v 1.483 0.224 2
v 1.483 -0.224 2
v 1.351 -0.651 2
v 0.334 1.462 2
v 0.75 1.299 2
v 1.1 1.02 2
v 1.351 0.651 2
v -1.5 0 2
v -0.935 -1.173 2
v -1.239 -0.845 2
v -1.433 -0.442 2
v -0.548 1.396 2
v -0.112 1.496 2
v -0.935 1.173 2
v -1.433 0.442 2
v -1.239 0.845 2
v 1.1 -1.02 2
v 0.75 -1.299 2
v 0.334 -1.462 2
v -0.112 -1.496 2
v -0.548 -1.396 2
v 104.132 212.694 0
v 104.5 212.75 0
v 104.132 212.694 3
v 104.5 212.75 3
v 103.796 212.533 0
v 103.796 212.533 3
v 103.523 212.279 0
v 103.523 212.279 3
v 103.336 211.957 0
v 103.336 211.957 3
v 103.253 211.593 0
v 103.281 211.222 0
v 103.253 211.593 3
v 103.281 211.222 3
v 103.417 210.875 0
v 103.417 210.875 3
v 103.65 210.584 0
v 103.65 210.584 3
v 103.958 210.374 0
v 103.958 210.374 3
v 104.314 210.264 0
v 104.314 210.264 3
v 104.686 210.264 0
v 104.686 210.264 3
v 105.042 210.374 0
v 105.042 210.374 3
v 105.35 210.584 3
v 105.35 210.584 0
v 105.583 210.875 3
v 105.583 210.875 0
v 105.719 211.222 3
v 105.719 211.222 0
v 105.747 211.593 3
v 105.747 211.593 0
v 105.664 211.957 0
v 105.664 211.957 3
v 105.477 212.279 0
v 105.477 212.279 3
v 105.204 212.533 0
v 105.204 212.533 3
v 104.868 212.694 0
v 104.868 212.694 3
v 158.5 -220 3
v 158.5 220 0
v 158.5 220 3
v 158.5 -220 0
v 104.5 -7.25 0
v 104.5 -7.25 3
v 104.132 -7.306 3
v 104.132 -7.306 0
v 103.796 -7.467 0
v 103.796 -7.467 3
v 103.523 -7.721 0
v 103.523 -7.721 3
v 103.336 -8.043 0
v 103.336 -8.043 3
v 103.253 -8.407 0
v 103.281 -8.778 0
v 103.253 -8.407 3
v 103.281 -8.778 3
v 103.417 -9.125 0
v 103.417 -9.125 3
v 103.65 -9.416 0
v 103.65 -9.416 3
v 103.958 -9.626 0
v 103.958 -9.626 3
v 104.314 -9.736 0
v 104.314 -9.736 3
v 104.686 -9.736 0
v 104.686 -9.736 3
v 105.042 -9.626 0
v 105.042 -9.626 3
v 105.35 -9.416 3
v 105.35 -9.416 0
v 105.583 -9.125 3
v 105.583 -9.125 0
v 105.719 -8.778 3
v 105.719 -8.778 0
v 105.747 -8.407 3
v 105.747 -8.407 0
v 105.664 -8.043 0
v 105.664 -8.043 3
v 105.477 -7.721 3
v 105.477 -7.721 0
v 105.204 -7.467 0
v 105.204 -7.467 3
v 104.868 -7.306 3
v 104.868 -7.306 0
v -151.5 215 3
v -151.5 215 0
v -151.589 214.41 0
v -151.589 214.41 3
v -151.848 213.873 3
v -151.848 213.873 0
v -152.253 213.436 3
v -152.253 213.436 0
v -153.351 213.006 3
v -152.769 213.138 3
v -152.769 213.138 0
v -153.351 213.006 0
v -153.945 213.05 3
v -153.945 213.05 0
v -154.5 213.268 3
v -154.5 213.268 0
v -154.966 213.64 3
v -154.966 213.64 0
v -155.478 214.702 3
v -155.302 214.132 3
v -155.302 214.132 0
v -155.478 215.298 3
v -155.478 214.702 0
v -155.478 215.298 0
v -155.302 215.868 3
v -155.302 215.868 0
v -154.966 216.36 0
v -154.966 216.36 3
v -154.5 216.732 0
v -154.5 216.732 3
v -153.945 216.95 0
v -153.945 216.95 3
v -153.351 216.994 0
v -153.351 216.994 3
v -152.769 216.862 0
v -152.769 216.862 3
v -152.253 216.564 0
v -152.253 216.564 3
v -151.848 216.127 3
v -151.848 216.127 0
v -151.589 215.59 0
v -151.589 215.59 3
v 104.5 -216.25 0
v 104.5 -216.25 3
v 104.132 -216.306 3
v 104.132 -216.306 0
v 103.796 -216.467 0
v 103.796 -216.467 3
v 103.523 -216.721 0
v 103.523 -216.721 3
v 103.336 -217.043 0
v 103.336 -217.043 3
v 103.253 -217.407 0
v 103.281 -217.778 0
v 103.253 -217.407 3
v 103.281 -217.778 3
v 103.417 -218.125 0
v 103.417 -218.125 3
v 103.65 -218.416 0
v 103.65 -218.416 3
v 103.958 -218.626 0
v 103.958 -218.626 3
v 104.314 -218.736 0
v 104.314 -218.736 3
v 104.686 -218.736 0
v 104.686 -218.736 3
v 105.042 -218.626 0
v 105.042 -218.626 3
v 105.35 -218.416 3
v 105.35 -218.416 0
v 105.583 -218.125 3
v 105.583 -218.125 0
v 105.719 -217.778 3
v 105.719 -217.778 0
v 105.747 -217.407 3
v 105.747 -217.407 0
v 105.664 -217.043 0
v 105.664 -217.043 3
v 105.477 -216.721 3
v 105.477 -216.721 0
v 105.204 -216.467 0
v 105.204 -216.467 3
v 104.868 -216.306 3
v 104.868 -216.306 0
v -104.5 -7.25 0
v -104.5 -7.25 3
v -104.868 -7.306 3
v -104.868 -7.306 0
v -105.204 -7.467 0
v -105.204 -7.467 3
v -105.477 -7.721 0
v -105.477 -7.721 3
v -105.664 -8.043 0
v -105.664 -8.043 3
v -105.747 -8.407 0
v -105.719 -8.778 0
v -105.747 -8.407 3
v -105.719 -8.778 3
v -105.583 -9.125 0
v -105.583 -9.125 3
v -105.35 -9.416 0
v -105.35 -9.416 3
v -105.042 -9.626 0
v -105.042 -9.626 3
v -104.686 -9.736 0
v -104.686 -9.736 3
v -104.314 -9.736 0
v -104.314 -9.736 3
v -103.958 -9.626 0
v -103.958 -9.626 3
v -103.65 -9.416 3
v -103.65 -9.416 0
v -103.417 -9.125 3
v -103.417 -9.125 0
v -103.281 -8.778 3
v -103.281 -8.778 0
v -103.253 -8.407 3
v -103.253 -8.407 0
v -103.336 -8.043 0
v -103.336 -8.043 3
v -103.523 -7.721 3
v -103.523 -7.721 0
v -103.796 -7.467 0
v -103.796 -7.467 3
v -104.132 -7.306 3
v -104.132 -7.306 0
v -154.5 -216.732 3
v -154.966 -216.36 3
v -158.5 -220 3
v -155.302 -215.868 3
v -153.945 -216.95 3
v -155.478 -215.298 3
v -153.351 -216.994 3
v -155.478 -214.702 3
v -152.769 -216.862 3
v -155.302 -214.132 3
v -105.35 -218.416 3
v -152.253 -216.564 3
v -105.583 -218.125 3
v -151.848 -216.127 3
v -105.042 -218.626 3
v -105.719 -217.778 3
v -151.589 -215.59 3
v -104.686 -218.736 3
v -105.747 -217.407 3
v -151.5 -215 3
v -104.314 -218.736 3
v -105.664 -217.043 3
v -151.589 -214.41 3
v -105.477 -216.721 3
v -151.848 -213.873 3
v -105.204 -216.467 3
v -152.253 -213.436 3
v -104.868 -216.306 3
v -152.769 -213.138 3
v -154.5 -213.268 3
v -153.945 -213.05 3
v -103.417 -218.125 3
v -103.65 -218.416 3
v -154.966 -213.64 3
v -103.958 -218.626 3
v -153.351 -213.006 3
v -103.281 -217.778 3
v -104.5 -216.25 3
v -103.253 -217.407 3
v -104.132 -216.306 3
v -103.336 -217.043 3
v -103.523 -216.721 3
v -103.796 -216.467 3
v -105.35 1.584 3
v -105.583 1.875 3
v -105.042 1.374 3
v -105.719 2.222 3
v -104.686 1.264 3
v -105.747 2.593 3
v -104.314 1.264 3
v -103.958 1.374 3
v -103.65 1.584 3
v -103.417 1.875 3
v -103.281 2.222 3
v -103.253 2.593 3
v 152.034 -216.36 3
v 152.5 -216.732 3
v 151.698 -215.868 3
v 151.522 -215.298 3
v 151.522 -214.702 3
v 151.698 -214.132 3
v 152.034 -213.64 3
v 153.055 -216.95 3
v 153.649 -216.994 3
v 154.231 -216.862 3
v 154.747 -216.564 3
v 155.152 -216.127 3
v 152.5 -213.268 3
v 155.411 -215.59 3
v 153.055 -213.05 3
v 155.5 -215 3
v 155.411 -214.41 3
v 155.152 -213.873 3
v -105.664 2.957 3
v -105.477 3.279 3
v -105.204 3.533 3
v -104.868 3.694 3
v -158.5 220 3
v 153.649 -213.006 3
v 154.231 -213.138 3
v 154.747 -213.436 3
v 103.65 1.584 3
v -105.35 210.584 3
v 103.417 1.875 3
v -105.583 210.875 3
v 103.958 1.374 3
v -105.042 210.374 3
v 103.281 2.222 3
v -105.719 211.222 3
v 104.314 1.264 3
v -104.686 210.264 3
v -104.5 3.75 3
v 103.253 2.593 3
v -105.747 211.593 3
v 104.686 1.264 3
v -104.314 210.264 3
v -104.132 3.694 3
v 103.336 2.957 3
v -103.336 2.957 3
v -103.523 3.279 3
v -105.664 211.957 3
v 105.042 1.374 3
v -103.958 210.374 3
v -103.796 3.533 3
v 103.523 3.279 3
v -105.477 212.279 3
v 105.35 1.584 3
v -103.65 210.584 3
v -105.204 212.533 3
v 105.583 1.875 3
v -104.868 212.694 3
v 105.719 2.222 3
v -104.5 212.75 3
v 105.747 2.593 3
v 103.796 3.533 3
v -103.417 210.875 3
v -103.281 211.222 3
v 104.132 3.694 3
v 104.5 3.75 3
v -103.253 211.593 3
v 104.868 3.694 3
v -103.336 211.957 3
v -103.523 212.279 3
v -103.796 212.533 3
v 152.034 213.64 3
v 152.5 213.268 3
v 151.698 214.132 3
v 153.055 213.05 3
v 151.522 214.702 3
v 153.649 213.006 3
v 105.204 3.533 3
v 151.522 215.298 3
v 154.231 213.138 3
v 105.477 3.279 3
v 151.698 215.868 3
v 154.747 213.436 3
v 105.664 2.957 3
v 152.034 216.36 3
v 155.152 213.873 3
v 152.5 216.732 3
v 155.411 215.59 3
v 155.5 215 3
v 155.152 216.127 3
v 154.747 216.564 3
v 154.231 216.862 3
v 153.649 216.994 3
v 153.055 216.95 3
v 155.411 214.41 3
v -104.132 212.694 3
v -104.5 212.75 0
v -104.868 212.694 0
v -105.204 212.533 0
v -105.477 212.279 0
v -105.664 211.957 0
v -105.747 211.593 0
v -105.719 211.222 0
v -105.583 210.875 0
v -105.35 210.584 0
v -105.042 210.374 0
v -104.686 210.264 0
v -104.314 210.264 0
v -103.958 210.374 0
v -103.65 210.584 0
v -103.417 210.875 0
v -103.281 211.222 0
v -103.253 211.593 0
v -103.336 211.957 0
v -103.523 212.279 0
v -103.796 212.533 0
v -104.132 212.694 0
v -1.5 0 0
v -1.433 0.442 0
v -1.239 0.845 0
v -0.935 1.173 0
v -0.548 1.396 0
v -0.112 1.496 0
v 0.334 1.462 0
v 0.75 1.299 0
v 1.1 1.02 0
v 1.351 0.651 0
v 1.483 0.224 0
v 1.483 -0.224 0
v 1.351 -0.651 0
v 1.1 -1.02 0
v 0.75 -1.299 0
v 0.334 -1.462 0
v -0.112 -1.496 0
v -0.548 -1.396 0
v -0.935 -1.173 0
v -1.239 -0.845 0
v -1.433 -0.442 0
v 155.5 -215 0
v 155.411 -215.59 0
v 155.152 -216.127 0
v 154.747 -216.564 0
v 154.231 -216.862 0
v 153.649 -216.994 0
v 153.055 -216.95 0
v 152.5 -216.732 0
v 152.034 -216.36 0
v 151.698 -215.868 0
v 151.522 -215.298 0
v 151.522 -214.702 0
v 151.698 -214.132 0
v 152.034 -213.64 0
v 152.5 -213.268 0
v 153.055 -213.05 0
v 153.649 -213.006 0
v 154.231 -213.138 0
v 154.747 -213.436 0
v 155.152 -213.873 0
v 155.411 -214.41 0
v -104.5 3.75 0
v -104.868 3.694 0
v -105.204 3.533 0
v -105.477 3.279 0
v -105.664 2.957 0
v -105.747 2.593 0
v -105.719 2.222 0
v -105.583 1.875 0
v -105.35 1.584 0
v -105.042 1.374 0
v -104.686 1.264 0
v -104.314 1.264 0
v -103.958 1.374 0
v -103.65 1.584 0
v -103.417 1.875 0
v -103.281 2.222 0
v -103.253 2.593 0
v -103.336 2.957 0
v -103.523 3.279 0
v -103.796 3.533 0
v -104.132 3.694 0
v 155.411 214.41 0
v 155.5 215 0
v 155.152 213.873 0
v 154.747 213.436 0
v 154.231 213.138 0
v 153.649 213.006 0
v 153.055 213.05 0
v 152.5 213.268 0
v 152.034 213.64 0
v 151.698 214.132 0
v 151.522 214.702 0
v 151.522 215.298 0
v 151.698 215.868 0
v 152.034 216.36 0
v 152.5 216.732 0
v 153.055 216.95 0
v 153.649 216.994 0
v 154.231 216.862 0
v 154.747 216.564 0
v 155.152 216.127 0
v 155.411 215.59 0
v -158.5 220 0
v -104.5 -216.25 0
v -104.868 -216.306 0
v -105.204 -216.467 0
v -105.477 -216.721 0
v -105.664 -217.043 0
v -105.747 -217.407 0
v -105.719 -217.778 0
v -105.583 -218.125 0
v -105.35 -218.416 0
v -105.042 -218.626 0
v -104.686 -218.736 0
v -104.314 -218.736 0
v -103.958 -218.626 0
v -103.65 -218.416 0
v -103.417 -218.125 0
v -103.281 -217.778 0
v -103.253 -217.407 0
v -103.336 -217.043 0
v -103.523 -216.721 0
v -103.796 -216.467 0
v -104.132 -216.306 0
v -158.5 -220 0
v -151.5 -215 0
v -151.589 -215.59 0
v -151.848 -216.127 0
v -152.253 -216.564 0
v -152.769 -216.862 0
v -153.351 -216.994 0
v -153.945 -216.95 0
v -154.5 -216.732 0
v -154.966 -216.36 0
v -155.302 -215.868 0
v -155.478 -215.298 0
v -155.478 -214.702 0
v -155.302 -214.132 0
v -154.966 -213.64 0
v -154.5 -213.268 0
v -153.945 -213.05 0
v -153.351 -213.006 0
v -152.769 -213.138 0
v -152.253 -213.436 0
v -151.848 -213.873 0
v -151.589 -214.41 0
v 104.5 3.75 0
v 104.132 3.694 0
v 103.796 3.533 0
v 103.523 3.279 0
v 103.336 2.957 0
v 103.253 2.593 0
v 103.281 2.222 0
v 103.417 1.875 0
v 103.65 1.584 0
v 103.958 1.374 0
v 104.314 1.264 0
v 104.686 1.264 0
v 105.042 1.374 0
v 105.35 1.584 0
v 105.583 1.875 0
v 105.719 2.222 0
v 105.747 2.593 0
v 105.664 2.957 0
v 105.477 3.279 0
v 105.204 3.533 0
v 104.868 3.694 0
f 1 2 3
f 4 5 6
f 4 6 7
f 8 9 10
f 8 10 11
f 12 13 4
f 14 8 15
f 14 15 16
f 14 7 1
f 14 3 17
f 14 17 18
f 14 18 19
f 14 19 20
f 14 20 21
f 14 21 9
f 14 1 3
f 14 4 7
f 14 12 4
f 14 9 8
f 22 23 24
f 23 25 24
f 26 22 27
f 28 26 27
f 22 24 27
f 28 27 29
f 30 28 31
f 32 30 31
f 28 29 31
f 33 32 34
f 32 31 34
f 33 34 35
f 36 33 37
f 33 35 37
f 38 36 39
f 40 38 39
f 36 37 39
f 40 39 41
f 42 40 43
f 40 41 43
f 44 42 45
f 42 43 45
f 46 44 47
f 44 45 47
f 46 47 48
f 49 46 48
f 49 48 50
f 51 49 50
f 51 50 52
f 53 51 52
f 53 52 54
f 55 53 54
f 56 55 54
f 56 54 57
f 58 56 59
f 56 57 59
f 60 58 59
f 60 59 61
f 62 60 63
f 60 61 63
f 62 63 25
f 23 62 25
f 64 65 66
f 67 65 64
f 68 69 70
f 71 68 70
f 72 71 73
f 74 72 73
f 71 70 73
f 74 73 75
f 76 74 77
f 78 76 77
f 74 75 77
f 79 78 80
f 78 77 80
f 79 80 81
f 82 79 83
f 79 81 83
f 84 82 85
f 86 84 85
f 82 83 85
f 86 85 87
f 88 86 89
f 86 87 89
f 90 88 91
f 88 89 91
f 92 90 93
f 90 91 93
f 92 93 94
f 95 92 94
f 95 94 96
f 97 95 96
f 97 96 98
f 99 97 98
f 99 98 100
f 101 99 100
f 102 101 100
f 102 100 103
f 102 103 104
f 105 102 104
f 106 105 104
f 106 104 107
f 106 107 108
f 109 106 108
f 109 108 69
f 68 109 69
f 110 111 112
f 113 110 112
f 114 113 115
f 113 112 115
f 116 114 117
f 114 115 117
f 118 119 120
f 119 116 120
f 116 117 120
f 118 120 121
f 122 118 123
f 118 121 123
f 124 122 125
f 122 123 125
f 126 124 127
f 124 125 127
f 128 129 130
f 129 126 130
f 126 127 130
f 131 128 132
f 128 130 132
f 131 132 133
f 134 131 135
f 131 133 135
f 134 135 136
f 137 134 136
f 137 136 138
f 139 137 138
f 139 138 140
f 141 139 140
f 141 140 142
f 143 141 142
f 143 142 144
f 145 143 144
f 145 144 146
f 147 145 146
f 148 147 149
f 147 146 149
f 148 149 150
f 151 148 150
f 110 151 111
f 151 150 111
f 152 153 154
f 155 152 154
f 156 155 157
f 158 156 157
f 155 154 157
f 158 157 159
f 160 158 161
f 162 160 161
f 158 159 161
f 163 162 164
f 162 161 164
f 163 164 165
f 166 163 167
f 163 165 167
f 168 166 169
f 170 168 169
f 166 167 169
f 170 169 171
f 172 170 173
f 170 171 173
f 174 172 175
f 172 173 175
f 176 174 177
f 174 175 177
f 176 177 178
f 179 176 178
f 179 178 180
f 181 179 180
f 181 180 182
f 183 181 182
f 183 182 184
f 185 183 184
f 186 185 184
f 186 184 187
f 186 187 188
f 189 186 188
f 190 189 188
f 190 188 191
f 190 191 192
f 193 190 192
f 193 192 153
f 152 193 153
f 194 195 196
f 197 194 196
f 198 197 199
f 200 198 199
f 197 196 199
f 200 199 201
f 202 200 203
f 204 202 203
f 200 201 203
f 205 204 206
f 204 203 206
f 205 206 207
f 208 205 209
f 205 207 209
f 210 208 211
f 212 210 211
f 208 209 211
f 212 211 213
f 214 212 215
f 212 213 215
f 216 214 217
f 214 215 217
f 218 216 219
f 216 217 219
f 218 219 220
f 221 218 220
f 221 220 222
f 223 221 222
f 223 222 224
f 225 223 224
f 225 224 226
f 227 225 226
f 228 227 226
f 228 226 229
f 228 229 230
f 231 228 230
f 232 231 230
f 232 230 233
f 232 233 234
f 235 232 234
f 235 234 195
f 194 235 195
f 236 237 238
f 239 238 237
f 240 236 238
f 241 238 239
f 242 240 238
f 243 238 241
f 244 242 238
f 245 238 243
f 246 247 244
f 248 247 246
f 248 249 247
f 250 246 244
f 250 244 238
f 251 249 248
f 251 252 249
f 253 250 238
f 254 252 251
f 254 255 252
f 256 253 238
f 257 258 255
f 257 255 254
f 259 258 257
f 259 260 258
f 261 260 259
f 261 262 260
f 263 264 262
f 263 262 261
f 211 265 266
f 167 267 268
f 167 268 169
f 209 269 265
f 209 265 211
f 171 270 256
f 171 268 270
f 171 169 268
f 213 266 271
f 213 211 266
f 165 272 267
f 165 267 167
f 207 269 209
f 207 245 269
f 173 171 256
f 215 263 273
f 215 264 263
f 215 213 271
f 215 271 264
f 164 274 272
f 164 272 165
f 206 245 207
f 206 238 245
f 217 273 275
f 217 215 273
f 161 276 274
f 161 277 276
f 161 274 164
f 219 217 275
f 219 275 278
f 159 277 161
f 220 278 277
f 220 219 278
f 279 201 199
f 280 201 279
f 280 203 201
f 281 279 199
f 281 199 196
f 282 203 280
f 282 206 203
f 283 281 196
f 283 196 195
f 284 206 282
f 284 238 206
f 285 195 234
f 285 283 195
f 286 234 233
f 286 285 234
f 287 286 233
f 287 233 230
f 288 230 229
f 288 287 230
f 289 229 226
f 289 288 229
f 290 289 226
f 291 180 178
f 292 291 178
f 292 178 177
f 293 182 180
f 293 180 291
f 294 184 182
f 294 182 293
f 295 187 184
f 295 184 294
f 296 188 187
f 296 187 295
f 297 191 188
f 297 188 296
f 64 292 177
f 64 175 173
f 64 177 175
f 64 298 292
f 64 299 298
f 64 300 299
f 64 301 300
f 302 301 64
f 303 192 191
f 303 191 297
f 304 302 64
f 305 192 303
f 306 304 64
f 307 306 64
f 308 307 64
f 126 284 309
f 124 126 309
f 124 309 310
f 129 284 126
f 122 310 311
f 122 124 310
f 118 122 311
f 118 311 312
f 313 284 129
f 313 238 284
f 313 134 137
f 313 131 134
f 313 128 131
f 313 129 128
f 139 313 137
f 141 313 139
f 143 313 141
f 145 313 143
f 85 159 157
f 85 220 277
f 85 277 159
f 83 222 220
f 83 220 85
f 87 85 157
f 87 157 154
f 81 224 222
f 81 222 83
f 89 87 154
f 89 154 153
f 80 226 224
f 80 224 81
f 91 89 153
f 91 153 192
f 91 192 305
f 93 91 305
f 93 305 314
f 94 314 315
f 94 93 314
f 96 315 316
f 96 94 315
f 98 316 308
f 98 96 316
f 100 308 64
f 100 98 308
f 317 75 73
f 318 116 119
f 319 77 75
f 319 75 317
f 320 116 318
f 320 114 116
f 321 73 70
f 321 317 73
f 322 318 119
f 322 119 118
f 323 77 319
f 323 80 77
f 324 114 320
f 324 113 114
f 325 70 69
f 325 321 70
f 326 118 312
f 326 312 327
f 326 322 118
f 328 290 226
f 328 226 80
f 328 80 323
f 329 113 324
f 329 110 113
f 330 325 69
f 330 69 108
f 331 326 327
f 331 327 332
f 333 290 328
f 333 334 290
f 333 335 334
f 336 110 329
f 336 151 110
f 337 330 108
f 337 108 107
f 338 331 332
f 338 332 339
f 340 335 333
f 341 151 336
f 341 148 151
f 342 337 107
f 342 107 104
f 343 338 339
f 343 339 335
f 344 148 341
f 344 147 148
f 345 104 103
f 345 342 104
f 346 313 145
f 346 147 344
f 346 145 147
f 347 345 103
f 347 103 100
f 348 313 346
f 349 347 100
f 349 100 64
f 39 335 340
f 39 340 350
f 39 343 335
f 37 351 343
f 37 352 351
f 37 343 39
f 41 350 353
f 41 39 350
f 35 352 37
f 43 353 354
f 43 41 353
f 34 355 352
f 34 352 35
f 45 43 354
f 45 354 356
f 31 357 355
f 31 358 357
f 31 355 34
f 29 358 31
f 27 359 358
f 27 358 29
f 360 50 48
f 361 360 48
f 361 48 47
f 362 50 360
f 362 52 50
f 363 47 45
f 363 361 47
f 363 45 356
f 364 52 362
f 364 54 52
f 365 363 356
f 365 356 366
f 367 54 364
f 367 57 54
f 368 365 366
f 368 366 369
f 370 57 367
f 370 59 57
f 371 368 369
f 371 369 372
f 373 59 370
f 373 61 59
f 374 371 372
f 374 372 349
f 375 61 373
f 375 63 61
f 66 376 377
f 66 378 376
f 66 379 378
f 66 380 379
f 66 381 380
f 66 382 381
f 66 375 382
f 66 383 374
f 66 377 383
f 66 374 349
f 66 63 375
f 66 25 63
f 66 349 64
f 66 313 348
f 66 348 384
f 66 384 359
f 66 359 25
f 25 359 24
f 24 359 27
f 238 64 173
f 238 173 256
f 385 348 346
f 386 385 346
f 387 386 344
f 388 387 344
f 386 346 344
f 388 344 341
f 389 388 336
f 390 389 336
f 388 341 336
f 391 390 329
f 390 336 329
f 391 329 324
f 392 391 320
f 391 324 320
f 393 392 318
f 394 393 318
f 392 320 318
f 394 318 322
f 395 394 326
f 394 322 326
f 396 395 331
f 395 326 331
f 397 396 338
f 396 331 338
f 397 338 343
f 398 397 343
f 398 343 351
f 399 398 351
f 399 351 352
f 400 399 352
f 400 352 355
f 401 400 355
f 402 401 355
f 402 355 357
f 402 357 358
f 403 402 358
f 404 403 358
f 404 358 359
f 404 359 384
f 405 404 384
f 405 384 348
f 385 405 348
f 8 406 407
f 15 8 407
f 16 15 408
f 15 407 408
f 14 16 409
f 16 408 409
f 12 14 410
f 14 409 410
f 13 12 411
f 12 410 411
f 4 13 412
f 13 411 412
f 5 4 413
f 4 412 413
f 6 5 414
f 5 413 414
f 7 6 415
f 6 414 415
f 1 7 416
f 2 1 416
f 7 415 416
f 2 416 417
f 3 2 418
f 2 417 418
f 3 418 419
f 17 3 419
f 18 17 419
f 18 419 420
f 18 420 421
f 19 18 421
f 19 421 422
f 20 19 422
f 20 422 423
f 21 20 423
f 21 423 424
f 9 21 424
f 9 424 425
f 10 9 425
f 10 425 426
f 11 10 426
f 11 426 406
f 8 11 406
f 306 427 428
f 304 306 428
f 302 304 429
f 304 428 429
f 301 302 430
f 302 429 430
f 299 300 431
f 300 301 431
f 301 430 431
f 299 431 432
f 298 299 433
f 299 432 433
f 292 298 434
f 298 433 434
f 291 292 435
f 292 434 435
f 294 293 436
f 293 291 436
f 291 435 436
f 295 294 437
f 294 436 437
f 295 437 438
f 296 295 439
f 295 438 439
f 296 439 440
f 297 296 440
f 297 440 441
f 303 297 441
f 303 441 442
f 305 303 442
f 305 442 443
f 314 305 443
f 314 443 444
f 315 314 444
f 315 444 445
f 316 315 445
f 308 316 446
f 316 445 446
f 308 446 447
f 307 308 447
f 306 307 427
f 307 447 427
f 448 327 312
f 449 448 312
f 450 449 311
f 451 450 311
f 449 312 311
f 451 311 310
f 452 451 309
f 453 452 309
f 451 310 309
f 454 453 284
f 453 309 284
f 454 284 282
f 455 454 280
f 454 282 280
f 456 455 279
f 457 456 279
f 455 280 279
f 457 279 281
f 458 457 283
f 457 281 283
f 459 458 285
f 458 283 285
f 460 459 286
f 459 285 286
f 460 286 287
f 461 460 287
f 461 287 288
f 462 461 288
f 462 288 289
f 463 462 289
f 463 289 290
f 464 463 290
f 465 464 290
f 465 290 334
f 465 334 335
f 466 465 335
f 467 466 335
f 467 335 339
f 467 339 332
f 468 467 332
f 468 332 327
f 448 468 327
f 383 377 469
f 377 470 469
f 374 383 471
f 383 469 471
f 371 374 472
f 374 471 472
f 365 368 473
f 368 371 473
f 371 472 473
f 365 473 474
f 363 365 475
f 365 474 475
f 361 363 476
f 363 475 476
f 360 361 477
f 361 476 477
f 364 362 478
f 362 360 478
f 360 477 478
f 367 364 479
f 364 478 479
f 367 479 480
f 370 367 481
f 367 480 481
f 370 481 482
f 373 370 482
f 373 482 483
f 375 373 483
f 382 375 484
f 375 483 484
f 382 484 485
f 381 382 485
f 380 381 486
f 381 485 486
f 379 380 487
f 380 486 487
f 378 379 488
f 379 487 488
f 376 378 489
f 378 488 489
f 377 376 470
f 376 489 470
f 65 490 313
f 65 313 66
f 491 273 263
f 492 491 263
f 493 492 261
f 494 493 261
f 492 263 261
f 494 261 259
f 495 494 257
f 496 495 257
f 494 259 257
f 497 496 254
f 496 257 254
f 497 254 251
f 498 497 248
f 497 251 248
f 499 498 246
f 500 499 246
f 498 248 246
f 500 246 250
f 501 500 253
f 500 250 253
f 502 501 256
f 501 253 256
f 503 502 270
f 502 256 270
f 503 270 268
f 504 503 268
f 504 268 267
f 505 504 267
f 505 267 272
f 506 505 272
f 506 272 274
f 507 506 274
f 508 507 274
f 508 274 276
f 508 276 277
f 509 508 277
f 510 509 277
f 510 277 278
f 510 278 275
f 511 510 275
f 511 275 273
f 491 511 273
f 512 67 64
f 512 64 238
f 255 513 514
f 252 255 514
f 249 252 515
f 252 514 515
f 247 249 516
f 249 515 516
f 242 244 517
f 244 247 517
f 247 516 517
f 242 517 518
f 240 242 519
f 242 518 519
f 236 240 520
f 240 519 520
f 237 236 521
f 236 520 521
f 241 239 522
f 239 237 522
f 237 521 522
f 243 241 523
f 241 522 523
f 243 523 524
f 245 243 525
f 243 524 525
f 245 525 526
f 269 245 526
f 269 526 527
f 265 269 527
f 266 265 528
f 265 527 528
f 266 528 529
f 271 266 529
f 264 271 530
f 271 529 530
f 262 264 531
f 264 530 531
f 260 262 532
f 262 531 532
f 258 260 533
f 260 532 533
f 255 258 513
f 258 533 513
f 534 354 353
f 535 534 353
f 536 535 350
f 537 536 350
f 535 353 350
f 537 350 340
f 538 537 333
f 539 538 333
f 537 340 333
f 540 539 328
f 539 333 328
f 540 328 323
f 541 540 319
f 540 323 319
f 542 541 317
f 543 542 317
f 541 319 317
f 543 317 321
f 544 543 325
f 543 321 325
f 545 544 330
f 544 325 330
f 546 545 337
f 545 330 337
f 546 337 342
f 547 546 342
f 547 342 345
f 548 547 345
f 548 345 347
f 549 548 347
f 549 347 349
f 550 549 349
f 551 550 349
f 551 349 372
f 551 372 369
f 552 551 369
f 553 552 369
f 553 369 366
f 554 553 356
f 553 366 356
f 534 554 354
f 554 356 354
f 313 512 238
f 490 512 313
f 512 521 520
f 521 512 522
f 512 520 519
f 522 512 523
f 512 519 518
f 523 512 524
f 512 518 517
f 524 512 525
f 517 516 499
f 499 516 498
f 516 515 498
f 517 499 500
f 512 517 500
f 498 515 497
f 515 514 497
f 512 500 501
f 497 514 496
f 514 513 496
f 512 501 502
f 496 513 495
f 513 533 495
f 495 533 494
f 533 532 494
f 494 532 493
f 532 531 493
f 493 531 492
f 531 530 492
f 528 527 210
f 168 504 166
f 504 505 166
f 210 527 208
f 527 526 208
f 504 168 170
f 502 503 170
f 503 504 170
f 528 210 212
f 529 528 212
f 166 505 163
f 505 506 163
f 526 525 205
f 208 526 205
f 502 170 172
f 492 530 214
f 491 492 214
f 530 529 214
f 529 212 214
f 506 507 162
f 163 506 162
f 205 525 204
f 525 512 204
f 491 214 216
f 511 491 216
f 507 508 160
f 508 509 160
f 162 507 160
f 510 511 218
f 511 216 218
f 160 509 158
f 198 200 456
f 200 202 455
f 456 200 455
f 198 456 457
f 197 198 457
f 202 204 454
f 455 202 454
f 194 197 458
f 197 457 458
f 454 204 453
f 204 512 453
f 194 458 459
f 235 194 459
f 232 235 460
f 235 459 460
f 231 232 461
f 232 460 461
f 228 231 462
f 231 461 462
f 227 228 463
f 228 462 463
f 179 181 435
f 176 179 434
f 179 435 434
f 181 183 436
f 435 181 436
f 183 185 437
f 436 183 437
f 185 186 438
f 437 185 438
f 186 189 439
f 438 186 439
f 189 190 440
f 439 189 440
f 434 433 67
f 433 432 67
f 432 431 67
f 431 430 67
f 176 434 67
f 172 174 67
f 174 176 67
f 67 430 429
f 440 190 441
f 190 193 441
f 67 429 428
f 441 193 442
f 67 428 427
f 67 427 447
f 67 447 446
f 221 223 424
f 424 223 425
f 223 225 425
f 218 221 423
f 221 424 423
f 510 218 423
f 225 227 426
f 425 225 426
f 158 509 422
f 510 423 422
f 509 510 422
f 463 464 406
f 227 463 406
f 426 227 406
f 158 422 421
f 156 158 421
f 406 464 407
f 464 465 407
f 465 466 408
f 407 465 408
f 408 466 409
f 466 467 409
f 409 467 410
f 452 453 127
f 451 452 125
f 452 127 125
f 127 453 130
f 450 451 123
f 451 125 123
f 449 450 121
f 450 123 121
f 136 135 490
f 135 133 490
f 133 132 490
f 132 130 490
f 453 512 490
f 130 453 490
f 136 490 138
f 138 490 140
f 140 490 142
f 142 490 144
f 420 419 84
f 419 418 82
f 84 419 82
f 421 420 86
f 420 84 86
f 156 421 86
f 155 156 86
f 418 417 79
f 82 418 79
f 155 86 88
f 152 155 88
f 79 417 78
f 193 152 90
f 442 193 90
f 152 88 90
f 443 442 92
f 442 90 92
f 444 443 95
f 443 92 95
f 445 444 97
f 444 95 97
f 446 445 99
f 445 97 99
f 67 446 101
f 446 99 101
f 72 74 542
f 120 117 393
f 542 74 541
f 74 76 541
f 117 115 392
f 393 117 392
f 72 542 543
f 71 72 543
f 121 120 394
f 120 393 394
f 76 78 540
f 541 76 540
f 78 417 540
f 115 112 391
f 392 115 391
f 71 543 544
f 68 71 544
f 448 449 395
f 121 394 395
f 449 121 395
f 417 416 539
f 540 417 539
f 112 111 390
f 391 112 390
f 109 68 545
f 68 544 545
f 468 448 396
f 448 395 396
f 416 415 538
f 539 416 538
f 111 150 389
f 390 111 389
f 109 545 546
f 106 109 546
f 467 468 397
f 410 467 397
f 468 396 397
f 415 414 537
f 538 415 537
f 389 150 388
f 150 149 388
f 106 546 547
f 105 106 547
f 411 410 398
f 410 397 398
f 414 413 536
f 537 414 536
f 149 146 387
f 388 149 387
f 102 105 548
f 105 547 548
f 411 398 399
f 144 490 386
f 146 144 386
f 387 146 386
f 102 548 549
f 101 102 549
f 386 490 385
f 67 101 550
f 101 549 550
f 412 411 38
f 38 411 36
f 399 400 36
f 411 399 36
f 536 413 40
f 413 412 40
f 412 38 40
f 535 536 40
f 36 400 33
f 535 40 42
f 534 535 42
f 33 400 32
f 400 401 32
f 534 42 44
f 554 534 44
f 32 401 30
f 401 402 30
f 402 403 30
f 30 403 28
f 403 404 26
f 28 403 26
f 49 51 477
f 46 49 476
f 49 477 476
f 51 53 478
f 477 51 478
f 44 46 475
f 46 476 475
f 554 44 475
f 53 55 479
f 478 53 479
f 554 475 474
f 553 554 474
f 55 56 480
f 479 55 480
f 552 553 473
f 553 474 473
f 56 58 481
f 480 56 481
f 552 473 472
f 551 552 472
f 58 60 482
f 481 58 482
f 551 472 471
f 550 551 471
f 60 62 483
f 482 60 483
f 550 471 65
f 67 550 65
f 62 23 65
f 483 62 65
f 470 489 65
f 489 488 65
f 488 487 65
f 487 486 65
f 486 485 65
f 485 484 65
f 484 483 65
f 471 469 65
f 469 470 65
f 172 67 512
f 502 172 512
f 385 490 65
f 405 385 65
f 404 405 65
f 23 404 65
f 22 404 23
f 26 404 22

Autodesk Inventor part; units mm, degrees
ref_plane "YZ Plane" through (0, 0, 0) normal (1, 0, 0) x (0, 1, 0)
ref_plane "XZ Plane" through (0, 0, 0) normal (0, 1, 0) x (-1, 0, 0)
ref_plane "XY Plane" through (0, 0, 0) normal (0, 0, 1) x (1, 0, 0)
sketch "Sketch1" plane through (0, 0, 0) normal (0, 0, 1) x (1, 0, 0)
  line L0 (-158.5, 220) -> (158.5, 220)
  line L1 (158.5, 220) -> (158.5, -220)
  line L2 (158.5, -220) -> (-158.5, -220)
  line L3 (-158.5, -220) -> (-158.5, 220)
  line L4 (-153.5, 215) -> (153.5, 215) construction
  line L5 (153.5, 215) -> (153.5, -215) construction
  line L6 (153.5, -215) -> (-153.5, -215) construction
  line L7 (-153.5, -215) -> (-153.5, 215) construction
  circle A0 centre (-153.5, 215) radius 2
  circle A1 centre (153.5, 215) radius 2
  circle A2 centre (153.5, -215) radius 2
  circle A3 centre (-153.5, -215) radius 2
  point P0 (0, 0)
  point P1 (0, 220)
  point P2 (-158.5, 0)
  point P3 (0, 215)
  point P4 (-153.5, 0)
  dimension "d0" = 440
  dimension "d1" = 317
  dimension "d3" = 5
  dimension "d4" = 5
  dimension "d5" = 4
extrude "Extrusion1" add sketch "Sketch1" along normal blind 3
sketch "Sketch2" plane through (0, 0, 0) normal (0, 0, -1) x (-1, 0, 0)
  circle A0 centre (0, 0) radius 1.5
  dimension "d8" = 3
extrude "Extrusion2" cut sketch "Sketch2" against normal blind 2
sketch "Sketch3" plane through (0, 0, 0) normal (0, 0, -1) x (-1, 0, 0)
  circle A0 centre (104.5, 211.5) radius 1.5 projected
  circle A1 centre (104.5, 2.5) radius 1.5 projected
  circle A2 centre (-104.5, 2.5) radius 1.5 projected
  circle A3 centre (-104.5, 211.5) radius 1.5 projected
  circle A4 centre (-104.5, -8.5) radius 1.5 projected
  circle A5 centre (-104.5, -217.5) radius 1.5 projected
  circle A6 centre (104.5, -217.5) radius 1.5 projected
  circle A7 centre (104.5, -8.5) radius 1.5 projected
  point P0 (0, 0)
  point P1 (-1.0607, -1.0607)
hole "Hole1" at (-104.5, 211.5, 0) at (-104.5, 2.5, 0) at (-104.5, -8.5, 0) at (104.5, -8.5, 0) at (104.5, 2.5, 0) at (104.5, 211.5, 0) at (-104.5, -217.5, 0) at (104.5, -217.5, 0) direction (0, 0, 1) diameter 2.5 end through all
properties part number "0008-10-017 Heated bed" material "Aluminum 6061"
